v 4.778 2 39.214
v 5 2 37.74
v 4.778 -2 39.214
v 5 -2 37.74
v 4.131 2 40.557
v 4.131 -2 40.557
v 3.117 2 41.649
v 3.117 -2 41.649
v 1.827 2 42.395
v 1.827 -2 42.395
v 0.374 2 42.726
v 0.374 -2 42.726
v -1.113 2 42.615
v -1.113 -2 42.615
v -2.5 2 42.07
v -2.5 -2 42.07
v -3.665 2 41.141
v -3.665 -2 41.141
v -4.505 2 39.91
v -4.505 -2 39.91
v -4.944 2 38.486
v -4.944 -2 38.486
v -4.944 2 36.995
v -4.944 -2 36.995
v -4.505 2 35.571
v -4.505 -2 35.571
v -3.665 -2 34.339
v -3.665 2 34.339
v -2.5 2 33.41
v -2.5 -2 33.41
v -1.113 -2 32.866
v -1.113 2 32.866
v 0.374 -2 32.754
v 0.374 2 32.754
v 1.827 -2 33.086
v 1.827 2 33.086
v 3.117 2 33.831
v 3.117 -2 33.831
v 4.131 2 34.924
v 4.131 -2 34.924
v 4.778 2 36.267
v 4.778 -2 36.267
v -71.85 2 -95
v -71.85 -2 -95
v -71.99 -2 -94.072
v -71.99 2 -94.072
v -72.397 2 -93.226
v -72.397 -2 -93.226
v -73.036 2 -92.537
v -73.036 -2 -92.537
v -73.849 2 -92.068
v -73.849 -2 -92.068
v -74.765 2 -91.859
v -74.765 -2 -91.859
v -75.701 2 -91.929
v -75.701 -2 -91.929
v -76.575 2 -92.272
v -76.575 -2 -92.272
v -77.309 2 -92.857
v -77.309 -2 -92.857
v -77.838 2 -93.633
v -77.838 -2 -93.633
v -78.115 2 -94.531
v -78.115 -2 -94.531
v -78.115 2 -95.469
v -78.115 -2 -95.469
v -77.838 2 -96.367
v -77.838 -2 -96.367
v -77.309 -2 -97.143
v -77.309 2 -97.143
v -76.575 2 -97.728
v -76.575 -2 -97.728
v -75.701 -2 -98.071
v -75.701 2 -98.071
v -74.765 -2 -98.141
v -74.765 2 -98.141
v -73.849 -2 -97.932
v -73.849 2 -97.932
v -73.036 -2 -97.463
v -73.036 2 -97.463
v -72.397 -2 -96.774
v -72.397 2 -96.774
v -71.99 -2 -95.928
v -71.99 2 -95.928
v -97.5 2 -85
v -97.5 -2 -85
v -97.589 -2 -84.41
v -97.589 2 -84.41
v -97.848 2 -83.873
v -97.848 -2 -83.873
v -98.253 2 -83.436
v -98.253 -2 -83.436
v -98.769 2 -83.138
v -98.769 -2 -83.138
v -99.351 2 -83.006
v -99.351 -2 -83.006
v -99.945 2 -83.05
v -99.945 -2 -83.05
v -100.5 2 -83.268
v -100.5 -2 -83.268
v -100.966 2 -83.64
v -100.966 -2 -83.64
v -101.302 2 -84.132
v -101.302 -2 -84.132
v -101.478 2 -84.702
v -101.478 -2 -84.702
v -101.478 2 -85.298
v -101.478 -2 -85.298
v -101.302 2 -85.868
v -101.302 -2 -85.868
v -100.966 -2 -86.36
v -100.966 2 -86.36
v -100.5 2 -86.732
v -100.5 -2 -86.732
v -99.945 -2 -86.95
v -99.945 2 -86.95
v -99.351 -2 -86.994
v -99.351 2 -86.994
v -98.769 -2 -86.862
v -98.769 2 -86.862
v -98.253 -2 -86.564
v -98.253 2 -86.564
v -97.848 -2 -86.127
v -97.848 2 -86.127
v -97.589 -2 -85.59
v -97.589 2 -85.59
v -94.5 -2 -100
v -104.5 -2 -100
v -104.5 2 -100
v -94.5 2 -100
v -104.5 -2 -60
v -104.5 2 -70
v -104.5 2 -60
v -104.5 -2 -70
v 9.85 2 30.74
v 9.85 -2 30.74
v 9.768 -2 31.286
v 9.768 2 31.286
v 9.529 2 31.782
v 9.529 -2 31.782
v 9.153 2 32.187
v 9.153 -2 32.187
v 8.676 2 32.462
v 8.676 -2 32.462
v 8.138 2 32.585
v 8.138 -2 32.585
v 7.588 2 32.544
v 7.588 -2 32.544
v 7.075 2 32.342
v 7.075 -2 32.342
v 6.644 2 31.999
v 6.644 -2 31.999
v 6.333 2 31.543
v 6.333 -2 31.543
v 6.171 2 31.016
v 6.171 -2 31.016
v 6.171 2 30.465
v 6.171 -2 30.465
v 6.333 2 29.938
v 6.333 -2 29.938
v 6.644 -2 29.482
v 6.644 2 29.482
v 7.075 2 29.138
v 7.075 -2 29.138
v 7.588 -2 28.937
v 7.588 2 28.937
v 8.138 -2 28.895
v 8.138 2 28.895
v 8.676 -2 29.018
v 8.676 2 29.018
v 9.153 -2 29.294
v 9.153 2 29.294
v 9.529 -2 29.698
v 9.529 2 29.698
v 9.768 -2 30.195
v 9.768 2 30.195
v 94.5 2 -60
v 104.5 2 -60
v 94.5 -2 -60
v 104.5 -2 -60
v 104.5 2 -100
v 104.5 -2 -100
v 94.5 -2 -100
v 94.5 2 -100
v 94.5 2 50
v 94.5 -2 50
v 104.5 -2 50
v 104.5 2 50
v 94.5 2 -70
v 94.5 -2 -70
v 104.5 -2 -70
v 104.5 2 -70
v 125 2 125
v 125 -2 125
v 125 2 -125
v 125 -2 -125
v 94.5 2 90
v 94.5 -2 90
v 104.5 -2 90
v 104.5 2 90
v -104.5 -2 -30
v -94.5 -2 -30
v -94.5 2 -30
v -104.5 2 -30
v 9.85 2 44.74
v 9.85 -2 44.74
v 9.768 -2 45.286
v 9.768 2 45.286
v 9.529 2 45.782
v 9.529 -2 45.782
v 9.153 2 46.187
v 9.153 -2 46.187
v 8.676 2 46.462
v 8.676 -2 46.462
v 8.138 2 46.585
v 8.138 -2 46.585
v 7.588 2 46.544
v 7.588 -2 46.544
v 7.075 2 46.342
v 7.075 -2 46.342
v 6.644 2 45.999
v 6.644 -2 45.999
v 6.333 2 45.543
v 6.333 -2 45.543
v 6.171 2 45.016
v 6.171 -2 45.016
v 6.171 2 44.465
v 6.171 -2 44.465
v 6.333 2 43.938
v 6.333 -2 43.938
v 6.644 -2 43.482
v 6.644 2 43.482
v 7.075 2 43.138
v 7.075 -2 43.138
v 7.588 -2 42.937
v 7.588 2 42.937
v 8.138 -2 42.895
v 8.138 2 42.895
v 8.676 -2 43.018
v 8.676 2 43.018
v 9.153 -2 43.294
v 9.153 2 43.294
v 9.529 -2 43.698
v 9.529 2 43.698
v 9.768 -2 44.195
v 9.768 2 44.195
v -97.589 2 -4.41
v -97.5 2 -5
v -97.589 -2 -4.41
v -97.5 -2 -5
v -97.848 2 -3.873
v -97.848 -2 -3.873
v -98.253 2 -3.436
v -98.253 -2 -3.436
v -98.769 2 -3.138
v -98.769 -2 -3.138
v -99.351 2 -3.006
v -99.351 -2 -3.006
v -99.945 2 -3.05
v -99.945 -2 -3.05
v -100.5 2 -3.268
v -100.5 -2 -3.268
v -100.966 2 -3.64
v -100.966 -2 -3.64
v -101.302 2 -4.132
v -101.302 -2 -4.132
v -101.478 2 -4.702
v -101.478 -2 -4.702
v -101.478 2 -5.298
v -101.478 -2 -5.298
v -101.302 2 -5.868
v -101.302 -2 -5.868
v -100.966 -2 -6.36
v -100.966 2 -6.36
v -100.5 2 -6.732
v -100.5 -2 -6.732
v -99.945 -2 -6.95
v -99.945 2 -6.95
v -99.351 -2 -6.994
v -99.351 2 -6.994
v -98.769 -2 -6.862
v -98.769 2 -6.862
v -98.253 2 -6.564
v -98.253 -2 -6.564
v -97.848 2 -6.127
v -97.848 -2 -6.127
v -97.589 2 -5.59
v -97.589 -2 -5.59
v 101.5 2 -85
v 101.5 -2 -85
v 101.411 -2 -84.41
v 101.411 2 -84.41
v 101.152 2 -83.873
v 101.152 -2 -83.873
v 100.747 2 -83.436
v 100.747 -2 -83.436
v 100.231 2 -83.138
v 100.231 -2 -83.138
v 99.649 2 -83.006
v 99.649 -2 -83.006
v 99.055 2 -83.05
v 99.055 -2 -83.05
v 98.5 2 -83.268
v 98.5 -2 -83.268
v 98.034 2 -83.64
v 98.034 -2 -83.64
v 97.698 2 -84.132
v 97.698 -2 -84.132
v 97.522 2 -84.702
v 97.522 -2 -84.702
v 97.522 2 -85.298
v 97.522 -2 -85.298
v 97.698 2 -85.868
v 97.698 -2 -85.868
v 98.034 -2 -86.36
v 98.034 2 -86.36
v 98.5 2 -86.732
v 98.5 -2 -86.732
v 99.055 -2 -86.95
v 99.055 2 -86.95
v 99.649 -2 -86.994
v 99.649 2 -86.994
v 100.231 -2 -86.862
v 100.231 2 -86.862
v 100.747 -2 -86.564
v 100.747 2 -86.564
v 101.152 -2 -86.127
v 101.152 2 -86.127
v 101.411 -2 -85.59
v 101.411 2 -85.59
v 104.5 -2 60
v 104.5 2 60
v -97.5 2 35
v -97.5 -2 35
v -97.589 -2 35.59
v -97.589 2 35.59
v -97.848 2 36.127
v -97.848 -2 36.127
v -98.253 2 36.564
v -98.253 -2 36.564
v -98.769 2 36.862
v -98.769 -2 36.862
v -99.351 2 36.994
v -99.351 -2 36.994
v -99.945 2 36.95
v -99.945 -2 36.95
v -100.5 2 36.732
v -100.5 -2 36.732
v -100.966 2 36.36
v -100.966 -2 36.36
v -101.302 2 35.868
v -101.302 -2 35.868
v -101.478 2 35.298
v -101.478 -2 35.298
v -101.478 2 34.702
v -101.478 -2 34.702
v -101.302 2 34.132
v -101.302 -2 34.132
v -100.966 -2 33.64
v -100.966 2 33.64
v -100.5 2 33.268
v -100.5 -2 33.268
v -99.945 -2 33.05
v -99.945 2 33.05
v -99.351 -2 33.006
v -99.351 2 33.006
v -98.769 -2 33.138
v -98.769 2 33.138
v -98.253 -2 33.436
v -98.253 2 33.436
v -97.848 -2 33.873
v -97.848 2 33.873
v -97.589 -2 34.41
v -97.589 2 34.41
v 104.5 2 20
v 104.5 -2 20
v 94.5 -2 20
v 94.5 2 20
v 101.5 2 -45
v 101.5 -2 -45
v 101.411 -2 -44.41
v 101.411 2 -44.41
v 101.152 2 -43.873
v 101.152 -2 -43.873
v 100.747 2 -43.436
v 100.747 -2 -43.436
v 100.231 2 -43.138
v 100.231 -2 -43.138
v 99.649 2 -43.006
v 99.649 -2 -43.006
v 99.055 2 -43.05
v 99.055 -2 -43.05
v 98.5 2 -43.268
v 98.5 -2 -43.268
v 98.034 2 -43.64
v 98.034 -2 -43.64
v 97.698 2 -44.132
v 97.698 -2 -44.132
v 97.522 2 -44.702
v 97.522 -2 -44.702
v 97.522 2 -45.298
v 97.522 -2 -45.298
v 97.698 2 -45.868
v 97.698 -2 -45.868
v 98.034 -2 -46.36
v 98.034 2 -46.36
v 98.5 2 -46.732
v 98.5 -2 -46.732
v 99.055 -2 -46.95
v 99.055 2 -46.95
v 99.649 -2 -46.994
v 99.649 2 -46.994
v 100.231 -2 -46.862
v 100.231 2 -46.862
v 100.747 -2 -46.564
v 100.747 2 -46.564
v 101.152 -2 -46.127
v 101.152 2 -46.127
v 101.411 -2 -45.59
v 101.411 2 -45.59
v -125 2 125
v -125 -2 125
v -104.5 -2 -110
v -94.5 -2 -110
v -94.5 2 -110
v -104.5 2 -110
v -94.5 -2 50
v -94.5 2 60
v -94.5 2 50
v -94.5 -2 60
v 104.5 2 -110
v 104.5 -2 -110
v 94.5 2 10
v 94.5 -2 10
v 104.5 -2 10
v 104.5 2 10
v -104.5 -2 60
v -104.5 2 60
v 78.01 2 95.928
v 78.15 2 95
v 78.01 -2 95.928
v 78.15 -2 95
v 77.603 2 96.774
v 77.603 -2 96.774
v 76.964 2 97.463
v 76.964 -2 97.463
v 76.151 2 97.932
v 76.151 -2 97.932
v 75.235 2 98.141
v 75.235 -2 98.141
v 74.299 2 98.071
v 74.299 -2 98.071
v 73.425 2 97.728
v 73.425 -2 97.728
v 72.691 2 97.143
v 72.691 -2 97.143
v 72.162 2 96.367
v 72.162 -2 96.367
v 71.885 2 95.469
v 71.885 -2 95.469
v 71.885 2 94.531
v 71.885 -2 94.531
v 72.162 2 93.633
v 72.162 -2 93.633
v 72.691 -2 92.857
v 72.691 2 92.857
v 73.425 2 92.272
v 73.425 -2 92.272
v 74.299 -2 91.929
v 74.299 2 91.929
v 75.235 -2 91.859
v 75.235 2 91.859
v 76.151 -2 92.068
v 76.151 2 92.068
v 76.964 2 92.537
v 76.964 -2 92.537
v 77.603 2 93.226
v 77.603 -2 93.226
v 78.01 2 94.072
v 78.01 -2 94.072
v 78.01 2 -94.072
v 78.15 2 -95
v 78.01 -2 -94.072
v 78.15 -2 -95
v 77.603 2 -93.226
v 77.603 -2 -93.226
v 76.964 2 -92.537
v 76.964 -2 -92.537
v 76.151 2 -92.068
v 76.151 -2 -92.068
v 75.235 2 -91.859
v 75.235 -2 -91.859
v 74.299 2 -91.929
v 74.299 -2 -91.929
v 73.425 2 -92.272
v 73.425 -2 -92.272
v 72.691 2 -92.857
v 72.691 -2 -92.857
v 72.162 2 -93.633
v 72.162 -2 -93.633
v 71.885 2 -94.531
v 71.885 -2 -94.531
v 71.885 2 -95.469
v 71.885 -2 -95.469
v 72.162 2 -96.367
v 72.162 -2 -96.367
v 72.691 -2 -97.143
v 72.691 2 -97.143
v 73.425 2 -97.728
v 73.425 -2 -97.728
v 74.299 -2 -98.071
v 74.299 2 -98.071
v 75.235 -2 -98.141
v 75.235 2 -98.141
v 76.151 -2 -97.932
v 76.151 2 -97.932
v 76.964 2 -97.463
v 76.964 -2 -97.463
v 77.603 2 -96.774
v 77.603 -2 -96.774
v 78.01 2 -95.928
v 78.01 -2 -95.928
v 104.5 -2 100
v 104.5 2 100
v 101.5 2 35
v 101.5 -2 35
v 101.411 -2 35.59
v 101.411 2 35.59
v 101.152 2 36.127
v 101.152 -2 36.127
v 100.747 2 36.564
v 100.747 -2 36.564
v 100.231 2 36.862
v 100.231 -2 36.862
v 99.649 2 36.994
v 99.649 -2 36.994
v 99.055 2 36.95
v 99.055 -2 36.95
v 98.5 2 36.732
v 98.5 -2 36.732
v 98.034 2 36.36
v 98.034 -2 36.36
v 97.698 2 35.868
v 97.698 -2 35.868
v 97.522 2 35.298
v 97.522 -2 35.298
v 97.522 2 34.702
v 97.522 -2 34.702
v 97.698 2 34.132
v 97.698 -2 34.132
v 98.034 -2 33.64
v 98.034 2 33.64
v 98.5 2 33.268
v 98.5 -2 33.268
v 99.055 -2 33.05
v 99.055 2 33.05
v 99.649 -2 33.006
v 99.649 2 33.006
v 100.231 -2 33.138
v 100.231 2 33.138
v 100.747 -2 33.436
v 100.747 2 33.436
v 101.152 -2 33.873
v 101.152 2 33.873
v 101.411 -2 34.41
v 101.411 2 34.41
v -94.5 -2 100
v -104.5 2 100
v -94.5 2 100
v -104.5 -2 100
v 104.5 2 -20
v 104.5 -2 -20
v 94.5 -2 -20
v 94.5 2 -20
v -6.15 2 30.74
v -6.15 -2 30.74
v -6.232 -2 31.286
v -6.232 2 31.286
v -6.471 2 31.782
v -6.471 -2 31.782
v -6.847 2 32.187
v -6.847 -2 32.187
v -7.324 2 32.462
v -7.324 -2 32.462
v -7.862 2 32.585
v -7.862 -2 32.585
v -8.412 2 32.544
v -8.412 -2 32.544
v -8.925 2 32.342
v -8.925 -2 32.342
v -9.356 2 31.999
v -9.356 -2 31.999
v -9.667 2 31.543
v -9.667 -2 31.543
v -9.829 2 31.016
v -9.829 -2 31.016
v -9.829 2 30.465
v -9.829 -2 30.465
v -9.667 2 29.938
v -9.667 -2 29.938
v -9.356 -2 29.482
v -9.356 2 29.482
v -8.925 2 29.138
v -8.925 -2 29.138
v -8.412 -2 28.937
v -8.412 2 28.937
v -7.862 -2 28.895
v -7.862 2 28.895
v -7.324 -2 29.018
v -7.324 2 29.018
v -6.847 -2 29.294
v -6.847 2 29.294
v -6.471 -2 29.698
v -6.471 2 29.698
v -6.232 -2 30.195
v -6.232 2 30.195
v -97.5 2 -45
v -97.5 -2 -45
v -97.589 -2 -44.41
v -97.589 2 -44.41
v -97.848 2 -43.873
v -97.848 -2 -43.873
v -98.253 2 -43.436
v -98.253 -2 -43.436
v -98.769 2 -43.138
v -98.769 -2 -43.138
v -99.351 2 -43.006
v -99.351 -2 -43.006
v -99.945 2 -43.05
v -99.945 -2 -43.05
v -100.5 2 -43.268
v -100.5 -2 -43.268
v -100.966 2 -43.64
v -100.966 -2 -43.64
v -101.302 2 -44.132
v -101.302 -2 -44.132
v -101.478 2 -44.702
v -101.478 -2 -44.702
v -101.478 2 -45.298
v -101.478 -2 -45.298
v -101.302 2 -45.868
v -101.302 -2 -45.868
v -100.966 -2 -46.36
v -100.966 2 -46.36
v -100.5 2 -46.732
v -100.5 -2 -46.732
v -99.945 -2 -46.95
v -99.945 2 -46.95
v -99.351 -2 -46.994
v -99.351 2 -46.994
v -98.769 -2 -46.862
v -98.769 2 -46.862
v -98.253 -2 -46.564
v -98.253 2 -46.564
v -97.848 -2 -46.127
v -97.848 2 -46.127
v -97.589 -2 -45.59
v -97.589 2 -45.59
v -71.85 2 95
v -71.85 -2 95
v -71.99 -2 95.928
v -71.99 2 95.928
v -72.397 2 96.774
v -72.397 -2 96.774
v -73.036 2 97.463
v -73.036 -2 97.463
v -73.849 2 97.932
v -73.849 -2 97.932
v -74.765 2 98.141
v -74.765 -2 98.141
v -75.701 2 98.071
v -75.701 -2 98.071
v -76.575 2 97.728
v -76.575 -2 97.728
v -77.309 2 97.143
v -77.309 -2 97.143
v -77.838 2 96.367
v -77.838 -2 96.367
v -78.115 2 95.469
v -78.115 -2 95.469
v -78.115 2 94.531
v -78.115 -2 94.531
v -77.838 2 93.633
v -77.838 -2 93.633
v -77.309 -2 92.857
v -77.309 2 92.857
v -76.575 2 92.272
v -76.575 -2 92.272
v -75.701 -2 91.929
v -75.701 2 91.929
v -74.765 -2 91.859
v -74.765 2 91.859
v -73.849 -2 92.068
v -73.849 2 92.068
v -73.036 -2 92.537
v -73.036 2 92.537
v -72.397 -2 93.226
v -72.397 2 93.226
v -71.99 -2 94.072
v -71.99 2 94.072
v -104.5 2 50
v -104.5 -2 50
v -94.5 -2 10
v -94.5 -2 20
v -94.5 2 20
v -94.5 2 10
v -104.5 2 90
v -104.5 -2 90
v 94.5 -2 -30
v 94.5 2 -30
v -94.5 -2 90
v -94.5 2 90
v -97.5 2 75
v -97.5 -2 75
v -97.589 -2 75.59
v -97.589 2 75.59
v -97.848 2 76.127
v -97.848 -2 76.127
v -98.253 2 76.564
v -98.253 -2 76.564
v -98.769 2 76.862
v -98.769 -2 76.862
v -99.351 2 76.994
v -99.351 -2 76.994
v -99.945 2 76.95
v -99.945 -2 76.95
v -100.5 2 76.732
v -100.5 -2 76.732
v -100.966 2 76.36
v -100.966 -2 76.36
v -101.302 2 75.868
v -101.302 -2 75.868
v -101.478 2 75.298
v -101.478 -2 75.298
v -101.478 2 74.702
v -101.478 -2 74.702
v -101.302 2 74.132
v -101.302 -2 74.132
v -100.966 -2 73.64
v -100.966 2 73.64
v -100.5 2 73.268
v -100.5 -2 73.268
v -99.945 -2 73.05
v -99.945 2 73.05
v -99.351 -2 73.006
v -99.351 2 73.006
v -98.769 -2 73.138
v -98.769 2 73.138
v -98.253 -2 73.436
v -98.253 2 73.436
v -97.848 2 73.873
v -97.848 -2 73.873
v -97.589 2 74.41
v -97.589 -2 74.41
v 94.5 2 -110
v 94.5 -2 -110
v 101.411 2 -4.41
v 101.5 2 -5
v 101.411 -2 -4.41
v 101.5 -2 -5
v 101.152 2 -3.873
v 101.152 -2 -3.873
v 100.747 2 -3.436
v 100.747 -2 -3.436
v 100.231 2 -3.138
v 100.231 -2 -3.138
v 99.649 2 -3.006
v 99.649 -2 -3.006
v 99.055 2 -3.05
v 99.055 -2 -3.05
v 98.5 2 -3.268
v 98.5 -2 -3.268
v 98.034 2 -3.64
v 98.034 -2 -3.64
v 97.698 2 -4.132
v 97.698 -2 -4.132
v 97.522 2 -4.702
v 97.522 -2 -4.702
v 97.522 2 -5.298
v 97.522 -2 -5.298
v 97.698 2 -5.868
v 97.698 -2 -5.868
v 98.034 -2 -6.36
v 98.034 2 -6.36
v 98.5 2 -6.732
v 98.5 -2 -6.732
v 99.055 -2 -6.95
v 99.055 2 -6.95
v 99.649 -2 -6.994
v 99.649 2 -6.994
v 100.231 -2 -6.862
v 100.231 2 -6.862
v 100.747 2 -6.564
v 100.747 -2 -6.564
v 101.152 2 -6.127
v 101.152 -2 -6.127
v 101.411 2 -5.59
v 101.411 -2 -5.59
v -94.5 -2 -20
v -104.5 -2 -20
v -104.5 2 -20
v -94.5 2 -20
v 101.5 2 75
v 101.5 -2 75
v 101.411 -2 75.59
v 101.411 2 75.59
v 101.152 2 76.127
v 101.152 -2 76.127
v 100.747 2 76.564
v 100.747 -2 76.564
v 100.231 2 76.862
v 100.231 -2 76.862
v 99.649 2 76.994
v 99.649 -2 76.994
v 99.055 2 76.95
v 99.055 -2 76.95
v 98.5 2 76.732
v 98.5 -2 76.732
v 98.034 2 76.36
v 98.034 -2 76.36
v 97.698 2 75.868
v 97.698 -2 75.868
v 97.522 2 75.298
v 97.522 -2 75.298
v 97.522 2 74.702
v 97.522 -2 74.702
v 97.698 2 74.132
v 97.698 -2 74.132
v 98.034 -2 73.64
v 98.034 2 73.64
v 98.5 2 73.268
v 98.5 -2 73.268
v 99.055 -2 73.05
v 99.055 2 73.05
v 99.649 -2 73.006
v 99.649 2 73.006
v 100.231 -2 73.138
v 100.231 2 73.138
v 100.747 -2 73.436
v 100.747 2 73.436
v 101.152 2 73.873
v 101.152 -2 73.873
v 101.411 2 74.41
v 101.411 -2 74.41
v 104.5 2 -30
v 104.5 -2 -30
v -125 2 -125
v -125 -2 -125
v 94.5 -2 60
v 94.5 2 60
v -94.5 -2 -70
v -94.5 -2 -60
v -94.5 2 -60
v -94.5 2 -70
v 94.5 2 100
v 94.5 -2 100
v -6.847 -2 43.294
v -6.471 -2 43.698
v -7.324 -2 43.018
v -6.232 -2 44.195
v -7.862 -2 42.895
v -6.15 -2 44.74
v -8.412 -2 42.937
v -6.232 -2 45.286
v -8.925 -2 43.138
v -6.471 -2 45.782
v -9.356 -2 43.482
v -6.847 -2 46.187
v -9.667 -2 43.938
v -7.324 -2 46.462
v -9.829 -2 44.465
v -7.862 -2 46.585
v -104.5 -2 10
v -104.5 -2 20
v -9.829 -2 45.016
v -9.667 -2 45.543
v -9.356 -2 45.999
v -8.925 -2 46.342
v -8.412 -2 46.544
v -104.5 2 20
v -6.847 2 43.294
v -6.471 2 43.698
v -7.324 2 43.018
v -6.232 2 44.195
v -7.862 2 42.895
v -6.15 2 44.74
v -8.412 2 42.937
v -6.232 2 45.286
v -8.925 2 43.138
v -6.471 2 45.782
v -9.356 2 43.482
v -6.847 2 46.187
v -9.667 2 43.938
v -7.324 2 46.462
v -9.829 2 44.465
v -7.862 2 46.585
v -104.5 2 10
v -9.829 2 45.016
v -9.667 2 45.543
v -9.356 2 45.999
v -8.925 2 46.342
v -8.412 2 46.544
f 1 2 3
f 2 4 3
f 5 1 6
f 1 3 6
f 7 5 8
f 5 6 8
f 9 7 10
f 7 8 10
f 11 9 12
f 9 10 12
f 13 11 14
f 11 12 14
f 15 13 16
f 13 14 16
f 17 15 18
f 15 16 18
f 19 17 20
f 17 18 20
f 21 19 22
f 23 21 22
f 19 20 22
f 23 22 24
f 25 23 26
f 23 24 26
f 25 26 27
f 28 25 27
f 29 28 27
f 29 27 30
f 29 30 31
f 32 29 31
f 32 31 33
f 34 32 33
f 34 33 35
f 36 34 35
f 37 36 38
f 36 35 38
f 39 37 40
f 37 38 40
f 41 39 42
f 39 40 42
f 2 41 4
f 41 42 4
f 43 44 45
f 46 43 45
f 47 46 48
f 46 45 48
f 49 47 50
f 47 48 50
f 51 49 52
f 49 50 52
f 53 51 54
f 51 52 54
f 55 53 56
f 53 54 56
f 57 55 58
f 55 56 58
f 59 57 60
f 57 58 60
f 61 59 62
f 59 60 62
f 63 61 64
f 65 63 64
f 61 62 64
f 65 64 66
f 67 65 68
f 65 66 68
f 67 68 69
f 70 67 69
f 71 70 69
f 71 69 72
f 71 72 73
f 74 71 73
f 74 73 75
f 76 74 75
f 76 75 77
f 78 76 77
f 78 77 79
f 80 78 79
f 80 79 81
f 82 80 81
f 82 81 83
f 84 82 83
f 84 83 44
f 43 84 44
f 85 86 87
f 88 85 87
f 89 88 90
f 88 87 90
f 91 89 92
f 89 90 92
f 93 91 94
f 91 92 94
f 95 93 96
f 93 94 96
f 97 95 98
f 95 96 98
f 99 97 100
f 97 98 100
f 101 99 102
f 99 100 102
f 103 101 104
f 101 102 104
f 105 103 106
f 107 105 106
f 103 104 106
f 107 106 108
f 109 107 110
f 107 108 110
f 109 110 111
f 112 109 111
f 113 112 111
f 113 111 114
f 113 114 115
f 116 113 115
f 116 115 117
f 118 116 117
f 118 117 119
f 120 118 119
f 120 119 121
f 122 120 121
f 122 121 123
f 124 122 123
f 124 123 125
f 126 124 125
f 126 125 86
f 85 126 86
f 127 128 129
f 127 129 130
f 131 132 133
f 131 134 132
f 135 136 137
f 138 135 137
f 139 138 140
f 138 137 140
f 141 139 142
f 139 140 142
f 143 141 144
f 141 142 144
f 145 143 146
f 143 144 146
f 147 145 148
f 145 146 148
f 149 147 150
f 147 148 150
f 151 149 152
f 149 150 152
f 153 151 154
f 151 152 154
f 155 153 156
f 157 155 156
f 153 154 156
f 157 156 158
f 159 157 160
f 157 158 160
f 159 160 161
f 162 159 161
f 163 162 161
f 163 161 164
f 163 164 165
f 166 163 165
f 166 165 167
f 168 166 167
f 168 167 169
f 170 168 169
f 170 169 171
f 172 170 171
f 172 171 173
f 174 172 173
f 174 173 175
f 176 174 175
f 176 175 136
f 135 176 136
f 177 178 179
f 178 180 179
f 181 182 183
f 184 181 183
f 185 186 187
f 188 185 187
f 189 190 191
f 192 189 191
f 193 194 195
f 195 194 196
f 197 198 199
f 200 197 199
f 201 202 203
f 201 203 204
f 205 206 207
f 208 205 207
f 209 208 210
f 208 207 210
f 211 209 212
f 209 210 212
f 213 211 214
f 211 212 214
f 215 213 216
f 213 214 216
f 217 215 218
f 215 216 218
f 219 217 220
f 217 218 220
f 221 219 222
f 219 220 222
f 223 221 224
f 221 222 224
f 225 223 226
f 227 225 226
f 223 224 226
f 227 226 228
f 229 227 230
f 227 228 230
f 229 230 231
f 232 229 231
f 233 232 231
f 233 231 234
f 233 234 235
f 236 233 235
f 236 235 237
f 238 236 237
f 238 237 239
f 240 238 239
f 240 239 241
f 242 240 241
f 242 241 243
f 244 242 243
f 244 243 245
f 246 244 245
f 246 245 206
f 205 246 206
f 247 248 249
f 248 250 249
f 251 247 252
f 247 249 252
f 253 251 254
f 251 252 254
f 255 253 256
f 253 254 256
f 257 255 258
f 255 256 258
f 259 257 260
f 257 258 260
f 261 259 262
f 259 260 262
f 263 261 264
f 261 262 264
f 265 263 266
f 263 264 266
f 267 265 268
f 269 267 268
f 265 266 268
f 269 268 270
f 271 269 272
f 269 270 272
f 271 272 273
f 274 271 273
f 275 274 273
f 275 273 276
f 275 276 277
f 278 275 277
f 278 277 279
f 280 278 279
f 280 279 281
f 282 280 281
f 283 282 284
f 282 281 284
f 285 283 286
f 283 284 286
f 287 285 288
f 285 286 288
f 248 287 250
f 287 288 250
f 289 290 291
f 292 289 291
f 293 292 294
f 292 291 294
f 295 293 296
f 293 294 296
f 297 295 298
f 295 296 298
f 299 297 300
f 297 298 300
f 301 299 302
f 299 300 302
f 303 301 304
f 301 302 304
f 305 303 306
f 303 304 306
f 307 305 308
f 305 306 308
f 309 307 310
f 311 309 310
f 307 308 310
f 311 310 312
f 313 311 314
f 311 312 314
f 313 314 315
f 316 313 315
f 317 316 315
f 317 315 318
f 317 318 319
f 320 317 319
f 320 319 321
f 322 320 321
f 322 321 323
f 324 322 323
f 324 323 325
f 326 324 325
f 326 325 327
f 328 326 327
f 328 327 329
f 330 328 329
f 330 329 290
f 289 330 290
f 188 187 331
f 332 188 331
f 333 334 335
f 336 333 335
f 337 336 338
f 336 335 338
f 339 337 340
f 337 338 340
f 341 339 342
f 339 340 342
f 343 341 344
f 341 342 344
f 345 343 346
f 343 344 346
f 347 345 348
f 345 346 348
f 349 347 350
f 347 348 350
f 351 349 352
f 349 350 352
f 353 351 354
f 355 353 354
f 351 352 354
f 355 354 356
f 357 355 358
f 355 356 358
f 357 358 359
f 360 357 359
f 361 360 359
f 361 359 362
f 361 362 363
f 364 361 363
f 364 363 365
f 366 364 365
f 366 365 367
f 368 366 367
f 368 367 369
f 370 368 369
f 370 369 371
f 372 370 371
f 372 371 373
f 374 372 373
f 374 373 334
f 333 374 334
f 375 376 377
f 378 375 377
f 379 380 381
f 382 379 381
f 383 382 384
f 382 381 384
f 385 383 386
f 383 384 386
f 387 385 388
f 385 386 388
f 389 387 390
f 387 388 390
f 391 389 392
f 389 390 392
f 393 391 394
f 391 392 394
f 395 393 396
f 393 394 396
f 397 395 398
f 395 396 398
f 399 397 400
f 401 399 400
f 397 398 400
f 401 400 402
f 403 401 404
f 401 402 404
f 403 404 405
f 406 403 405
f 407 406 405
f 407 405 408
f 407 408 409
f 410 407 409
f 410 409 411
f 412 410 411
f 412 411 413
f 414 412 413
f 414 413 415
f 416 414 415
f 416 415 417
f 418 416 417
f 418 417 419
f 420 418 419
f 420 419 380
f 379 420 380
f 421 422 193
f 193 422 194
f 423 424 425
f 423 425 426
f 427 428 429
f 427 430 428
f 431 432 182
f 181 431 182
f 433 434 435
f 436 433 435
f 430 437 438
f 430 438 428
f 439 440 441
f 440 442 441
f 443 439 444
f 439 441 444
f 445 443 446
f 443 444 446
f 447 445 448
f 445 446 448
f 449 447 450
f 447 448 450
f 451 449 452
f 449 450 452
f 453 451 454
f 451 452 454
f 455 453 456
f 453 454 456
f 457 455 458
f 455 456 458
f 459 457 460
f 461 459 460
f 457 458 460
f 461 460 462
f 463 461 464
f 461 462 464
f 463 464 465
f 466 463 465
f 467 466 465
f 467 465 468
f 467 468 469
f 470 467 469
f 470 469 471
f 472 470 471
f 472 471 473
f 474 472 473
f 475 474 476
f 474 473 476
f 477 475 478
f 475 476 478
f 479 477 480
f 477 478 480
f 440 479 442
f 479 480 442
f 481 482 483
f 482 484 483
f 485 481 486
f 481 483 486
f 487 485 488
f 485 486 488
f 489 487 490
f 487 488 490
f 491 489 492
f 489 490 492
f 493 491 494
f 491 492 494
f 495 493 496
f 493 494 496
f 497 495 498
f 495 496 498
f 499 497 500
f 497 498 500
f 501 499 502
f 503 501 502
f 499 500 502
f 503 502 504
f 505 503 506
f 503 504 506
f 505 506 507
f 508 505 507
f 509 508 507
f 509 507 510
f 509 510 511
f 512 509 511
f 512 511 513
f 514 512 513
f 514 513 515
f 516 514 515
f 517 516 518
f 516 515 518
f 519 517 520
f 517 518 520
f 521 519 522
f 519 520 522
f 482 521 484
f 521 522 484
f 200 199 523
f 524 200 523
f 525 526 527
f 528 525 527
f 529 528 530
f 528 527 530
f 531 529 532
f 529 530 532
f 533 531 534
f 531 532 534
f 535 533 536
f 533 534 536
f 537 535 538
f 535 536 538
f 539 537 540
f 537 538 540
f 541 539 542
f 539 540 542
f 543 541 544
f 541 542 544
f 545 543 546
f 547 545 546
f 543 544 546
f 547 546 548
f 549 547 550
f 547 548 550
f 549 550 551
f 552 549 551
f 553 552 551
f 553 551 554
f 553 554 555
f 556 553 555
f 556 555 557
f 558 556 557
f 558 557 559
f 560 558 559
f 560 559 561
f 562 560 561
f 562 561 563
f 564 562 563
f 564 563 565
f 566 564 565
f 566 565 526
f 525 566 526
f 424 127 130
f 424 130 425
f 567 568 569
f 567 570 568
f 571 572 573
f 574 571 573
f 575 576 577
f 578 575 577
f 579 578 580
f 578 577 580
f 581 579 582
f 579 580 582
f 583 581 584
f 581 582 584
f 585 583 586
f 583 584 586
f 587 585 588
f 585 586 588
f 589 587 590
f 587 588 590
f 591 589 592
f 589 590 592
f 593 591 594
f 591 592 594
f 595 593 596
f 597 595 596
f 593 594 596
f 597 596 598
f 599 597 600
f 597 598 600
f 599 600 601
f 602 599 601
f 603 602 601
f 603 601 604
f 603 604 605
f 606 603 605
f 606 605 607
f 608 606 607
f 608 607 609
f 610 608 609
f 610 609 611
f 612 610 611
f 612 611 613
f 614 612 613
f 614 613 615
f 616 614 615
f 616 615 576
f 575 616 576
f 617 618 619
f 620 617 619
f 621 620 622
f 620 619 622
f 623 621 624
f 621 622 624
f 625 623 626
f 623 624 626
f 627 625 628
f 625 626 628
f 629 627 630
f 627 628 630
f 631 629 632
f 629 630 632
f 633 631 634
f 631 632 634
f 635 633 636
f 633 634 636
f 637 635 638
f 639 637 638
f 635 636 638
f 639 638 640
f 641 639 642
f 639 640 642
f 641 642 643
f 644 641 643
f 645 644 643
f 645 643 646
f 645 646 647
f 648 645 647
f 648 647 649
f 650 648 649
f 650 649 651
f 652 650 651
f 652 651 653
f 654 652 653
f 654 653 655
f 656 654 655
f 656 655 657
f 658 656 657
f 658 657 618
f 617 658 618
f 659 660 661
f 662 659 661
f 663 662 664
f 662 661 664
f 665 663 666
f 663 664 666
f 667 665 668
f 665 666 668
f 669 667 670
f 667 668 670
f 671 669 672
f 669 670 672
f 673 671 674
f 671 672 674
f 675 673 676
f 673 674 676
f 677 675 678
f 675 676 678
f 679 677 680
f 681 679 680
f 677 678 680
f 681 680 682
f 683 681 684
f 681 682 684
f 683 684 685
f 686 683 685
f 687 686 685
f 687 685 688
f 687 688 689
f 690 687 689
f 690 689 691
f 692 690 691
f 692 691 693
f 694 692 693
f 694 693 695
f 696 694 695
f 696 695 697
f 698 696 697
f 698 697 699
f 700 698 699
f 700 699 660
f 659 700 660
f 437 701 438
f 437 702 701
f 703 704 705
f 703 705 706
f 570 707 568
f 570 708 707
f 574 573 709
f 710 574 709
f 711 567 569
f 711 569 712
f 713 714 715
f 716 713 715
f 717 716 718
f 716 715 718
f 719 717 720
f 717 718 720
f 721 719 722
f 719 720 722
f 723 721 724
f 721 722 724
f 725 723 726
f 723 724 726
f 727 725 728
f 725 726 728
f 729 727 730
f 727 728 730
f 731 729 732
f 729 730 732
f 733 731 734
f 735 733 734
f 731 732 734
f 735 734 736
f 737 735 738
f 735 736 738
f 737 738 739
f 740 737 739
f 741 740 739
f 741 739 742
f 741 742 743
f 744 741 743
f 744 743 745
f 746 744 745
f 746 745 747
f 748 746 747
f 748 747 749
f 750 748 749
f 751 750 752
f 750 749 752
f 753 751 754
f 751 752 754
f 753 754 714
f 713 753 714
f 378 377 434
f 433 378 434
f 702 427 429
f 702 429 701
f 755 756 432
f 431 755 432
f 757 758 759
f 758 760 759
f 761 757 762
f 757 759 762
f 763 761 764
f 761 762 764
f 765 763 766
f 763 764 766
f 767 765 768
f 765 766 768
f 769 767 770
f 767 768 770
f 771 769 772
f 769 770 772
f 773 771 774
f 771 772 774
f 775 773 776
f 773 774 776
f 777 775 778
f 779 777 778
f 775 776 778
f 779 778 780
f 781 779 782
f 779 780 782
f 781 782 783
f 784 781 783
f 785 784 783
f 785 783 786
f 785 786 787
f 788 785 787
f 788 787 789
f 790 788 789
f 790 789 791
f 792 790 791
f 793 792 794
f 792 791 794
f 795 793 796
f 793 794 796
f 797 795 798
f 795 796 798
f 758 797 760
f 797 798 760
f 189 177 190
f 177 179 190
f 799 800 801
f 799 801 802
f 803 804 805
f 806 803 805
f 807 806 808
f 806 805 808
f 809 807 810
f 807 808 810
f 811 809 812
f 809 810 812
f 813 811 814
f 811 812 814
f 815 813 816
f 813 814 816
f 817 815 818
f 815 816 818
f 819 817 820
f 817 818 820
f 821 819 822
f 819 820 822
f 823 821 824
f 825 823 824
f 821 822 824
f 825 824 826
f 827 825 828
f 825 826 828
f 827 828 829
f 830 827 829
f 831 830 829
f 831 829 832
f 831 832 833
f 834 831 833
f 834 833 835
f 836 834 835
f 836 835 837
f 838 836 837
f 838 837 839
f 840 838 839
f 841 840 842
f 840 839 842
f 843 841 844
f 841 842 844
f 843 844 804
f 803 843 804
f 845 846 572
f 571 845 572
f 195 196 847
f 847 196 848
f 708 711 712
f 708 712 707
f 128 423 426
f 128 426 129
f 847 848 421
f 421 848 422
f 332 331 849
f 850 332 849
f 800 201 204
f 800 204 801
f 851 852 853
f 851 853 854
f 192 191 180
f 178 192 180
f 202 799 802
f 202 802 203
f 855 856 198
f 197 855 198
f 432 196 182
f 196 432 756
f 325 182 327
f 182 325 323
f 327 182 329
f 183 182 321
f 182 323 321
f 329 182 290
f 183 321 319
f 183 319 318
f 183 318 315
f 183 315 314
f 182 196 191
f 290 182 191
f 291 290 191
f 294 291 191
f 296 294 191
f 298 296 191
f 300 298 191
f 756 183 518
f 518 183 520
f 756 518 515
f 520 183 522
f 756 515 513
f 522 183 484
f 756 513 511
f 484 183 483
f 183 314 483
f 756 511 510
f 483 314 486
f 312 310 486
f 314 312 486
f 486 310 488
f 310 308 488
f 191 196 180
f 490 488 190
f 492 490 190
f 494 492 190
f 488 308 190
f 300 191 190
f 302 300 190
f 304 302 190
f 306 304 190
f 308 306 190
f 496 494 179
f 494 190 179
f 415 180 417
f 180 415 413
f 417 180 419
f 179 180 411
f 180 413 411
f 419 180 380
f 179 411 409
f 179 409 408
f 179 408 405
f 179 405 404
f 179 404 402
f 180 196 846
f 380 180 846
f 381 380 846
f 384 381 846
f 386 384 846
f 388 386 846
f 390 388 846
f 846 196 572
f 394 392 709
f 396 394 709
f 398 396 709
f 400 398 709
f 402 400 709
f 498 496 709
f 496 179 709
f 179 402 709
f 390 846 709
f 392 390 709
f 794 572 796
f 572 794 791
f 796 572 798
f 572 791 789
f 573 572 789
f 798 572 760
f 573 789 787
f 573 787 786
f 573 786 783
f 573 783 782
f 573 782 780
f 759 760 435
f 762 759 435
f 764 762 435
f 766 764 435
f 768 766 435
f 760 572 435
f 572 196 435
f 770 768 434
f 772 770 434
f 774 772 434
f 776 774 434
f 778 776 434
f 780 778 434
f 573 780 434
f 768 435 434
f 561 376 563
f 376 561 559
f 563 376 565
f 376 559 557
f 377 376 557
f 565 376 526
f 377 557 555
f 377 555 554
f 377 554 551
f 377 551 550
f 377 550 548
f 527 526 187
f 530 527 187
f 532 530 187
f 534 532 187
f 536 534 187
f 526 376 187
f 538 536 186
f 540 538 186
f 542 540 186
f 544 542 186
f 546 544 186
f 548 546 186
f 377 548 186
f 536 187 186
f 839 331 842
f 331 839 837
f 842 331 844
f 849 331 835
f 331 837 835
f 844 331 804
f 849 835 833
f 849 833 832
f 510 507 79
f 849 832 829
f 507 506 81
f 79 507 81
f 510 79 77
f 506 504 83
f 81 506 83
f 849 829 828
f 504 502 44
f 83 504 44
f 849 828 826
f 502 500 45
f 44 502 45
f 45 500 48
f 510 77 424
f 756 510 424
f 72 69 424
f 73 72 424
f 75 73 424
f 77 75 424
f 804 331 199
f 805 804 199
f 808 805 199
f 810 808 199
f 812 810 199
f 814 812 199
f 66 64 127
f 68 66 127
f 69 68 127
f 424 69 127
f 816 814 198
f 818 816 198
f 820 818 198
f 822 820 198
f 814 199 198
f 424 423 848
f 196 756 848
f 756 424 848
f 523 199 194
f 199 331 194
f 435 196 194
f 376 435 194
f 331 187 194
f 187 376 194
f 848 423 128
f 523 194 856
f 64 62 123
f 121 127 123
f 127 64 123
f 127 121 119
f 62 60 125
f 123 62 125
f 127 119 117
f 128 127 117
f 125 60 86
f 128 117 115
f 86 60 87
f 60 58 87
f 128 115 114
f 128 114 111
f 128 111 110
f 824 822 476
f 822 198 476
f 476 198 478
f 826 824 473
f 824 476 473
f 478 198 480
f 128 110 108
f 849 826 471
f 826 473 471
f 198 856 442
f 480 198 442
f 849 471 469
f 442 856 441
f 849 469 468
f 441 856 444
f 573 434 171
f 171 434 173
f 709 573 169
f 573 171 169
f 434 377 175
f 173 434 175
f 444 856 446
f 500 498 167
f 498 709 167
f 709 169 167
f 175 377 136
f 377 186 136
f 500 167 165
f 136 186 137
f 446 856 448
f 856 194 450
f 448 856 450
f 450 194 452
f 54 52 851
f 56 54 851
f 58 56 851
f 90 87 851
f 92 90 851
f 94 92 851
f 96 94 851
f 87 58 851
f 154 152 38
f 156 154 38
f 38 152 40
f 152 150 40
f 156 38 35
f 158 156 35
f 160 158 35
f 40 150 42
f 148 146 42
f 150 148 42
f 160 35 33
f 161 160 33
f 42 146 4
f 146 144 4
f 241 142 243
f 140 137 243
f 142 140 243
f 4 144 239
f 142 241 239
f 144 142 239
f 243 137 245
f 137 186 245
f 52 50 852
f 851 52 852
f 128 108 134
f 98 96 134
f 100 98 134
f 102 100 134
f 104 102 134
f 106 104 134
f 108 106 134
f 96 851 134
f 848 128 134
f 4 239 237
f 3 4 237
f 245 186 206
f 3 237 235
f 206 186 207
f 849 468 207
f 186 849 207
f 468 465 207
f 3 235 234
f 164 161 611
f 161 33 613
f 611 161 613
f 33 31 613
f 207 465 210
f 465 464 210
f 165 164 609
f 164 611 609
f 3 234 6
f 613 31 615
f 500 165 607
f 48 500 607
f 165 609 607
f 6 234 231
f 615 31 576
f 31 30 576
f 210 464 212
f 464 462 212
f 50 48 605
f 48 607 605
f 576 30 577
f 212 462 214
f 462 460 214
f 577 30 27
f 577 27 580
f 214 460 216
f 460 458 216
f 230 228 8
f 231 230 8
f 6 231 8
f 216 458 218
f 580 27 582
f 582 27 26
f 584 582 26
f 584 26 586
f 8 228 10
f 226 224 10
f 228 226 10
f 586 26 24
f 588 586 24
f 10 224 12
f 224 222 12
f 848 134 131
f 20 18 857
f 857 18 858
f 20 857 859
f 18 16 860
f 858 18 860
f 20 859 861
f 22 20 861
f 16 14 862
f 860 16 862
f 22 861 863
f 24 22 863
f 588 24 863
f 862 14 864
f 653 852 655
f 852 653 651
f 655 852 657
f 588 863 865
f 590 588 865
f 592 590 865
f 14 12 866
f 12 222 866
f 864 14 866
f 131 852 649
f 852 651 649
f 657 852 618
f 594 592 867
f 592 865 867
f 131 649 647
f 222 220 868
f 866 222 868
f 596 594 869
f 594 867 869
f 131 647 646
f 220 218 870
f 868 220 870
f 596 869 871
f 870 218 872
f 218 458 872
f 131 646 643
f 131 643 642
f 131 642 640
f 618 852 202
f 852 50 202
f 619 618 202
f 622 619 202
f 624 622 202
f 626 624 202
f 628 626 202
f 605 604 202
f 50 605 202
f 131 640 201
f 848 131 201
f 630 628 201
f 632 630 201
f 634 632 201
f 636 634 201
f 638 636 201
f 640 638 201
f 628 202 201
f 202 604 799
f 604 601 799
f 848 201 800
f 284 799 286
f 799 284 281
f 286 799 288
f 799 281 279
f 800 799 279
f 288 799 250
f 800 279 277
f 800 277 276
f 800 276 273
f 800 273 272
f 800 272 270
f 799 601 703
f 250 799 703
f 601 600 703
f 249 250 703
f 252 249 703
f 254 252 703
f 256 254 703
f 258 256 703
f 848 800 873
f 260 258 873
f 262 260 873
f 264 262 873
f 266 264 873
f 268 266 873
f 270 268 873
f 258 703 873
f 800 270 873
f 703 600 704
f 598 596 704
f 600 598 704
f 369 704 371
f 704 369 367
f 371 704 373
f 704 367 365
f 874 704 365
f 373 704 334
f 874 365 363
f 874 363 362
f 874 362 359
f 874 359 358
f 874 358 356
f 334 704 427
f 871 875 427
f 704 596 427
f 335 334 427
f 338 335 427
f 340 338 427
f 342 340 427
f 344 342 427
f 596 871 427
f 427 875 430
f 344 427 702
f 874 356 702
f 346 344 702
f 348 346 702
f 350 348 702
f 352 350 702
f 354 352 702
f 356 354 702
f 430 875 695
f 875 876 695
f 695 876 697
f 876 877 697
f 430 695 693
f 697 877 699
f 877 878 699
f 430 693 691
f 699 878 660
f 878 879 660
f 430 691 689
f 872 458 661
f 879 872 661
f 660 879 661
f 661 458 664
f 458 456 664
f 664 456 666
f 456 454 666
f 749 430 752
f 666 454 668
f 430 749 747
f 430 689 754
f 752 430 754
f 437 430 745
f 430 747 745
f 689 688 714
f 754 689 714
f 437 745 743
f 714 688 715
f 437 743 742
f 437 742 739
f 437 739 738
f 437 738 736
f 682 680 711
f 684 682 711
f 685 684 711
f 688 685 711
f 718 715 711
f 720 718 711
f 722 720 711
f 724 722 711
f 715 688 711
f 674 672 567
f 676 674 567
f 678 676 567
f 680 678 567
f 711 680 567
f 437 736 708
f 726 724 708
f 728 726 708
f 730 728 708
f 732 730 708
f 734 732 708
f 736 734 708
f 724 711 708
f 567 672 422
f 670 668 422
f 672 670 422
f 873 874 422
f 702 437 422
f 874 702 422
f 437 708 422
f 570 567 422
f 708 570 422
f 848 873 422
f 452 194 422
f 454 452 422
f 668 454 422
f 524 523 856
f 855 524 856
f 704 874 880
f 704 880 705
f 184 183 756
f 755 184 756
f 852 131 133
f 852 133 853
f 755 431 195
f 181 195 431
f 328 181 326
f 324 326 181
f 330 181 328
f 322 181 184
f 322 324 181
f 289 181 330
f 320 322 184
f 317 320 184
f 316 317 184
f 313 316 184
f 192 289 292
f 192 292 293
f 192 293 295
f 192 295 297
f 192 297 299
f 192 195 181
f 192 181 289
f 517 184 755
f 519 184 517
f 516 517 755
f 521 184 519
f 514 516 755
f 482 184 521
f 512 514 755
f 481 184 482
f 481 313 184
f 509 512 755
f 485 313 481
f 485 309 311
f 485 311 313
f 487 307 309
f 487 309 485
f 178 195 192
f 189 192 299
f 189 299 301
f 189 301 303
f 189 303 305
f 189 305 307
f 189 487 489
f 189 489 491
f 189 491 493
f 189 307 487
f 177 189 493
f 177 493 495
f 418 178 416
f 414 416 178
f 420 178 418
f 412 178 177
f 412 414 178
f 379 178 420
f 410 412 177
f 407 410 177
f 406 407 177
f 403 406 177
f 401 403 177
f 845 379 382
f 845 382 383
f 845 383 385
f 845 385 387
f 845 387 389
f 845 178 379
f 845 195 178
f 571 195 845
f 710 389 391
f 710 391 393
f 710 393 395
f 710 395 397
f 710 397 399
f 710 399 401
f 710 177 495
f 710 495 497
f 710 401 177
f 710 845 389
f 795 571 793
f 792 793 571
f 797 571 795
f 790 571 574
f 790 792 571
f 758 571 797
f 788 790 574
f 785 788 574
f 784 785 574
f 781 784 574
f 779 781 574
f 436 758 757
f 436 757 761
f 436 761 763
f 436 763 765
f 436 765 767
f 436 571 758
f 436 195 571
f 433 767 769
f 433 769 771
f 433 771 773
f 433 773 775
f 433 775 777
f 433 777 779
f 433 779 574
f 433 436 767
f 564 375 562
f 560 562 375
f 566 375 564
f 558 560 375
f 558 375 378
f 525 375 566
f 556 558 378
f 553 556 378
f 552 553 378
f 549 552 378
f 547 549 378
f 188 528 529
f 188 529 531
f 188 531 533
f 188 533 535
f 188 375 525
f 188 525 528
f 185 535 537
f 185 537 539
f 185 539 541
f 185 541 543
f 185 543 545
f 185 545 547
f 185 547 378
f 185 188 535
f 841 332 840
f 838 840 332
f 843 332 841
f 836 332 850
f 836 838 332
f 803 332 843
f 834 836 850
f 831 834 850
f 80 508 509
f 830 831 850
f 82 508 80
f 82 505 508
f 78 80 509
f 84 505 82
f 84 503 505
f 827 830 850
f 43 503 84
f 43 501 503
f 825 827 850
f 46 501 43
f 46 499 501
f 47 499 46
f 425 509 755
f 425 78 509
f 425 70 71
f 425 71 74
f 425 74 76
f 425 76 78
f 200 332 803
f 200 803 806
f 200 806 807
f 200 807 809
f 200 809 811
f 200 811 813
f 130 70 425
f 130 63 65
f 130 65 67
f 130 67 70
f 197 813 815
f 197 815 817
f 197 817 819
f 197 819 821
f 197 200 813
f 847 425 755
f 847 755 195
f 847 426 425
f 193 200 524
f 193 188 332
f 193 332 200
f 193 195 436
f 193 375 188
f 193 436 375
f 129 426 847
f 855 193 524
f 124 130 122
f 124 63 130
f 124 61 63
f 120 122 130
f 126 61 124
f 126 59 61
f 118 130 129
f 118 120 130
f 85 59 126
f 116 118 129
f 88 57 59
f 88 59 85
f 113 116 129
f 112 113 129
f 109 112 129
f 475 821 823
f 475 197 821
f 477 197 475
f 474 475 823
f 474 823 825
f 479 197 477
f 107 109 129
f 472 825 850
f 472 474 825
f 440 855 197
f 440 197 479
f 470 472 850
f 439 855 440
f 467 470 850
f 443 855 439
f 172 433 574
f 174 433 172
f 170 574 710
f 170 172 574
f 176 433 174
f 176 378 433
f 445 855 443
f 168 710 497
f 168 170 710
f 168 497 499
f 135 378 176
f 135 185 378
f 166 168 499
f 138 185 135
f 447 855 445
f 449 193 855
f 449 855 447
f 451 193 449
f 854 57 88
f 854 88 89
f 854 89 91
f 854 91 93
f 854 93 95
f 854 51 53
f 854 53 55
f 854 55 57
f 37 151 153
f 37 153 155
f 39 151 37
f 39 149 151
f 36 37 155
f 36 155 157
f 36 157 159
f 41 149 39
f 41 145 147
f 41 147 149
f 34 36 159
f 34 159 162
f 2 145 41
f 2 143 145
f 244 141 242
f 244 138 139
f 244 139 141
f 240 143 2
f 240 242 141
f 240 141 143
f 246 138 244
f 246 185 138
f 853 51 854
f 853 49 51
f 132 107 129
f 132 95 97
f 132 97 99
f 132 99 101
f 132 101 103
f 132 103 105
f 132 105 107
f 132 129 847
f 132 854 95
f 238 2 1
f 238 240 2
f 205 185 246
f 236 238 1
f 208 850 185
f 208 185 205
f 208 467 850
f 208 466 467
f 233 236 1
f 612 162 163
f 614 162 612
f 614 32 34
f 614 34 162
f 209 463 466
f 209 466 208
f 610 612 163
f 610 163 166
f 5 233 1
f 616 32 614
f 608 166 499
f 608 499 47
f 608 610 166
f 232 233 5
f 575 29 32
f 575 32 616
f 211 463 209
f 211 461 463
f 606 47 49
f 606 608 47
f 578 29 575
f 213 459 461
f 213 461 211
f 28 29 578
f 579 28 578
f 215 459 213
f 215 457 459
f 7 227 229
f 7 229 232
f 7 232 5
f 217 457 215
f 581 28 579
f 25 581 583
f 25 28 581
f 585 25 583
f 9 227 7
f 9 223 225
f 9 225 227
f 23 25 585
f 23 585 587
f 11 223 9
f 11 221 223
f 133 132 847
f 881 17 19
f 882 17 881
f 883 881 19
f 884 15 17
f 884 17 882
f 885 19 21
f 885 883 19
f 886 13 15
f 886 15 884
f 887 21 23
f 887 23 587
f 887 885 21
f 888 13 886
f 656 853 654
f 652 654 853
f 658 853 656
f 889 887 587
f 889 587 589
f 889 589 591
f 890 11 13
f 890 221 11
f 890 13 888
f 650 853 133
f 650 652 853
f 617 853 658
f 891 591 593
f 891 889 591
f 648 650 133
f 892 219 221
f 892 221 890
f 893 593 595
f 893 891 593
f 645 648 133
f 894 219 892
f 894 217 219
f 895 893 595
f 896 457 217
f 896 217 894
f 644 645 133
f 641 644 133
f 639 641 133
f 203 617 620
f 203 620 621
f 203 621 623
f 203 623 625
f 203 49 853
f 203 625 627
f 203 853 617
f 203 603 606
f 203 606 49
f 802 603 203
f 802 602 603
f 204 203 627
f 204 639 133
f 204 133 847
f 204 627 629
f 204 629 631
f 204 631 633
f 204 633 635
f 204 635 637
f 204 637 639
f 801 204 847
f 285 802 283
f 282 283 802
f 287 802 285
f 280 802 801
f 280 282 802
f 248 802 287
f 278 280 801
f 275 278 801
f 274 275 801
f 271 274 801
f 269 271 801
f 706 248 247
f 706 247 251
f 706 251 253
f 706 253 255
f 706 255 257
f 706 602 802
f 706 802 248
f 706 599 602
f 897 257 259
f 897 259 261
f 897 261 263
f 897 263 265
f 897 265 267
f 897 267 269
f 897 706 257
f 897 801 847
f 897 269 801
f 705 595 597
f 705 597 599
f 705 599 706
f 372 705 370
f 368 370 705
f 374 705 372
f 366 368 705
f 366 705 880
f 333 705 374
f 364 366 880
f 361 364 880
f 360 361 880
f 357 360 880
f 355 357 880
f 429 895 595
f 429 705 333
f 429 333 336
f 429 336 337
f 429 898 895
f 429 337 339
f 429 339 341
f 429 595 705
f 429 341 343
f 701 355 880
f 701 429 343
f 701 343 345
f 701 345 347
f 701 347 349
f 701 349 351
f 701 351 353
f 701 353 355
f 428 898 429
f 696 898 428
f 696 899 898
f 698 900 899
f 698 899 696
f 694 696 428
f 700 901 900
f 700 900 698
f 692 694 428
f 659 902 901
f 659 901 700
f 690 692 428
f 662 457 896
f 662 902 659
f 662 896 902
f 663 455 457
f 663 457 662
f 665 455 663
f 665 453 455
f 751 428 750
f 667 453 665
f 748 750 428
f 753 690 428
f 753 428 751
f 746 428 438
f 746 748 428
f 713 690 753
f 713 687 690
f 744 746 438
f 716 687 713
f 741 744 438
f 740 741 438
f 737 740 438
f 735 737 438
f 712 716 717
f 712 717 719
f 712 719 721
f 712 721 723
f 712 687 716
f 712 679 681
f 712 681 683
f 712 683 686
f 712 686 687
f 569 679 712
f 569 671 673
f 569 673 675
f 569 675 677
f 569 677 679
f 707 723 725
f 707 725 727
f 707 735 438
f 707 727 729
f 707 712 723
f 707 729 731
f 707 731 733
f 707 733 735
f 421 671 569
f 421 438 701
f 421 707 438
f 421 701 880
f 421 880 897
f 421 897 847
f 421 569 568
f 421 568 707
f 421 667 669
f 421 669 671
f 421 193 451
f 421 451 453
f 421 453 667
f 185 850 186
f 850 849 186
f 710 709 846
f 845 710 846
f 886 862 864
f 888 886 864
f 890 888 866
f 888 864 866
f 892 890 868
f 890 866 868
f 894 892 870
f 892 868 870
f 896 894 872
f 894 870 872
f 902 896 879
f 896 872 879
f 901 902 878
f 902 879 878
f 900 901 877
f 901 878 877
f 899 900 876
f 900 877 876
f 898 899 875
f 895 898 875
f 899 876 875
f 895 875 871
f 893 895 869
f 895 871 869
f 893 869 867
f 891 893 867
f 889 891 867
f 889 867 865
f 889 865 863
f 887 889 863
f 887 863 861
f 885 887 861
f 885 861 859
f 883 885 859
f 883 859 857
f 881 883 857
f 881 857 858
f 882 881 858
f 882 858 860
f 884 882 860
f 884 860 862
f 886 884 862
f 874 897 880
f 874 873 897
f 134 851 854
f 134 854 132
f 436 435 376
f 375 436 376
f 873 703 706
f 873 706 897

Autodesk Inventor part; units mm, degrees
ref_plane "YZ Plane" through (0, 0, 0) normal (1, 0, 0) x (0, 1, 0)
ref_plane "XZ Plane" through (0, 0, 0) normal (0, 1, 0) x (-1, 0, 0)
ref_plane "XY Plane" through (0, 0, 0) normal (0, 0, 1) x (1, 0, 0)
sketch "Эскиз1" plane through (0, 0, 0) normal (0, 1, 0) x (-1, 0, 0)
  line L0 (125, 125) -> (-125, 125)
  line L1 (-125, 125) -> (-125, -125)
  line L2 (-125, -125) -> (125, -125)
  line L3 (125, -125) -> (125, 125)
  line L4 (125, 125) -> (-125, -125) construction
  line L5 (-125, 125) -> (125, -125) construction
  point P0 (0, 0)
  dimension "d0" = 250
  dimension "d1" = 250
extrude "Выдавливание1" add sketch "Эскиз1" along normal mid plane 4
sketch "Эскиз2" plane through (0, -2, 0) normal (0, -1, 0) x (1, 0, 0)
  line L0 (104.5, -110) -> (104.5, -100) projected
  line L1 (104.5, -100) -> (94.5, -100) projected
  line L2 (94.5, -100) -> (94.5, -110) projected
  line L3 (94.5, -110) -> (104.5, -110) projected
  circle A0 centre (99.5, -85) radius 2 projected
  line L4 (104.5, -70) -> (104.5, -60) projected
  line L5 (104.5, -60) -> (94.5, -60) projected
  line L6 (94.5, -60) -> (94.5, -70) projected
  line L7 (94.5, -70) -> (104.5, -70) projected
  circle A1 centre (99.5, -45) radius 2 projected
  line L8 (104.5, -30) -> (104.5, -20) projected
  line L9 (104.5, -20) -> (94.5, -20) projected
  line L10 (94.5, -20) -> (94.5, -30) projected
  line L11 (94.5, -30) -> (104.5, -30) projected
  circle A2 centre (99.5, -5) radius 2 projected
  line L12 (104.5, 10) -> (104.5, 20) projected
  line L13 (104.5, 20) -> (94.5, 20) projected
  line L14 (94.5, 20) -> (94.5, 10) projected
  line L15 (94.5, 10) -> (104.5, 10) projected
  circle A3 centre (99.5, 35) radius 2 projected
  line L16 (94.5, 55) -> (94.5, 50) projected
  line L17 (94.5, 50) -> (104.5, 50) projected
  line L18 (104.5, 50) -> (104.5, 55) projected
  line L19 (104.5, 55) -> (104.5, 60) projected
  line L20 (104.5, 60) -> (94.5, 60) projected
  line L21 (94.5, 60) -> (94.5, 55) projected
  line L22 (104.5, 90) -> (104.5, 100) projected
  line L23 (104.5, 100) -> (94.5, 100) projected
  line L24 (94.5, 100) -> (94.5, 90) projected
  line L25 (94.5, 90) -> (104.5, 90) projected
  line L26 (-104.5, 90) -> (-104.5, 100) projected
  line L27 (-94.5, 90) -> (-104.5, 90) projected
  line L28 (-94.5, 100) -> (-94.5, 90) projected
  line L29 (-104.5, 100) -> (-94.5, 100) projected
  line L30 (-104.5, 50) -> (-104.5, 55) projected
  line L31 (-94.5, 50) -> (-104.5, 50) projected
  line L32 (-94.5, 55) -> (-94.5, 50) projected
  line L33 (-94.5, 60) -> (-94.5, 55) projected
  line L34 (-104.5, 60) -> (-94.5, 60) projected
  line L35 (-104.5, 55) -> (-104.5, 60) projected
  line L36 (-104.5, 10) -> (-104.5, 20) projected
  line L37 (-94.5, 10) -> (-104.5, 10) projected
  line L38 (-94.5, 20) -> (-94.5, 10) projected
  line L39 (-104.5, 20) -> (-94.5, 20) projected
  line L40 (-104.5, -30) -> (-104.5, -20) projected
  line L41 (-94.5, -30) -> (-104.5, -30) projected
  line L42 (-94.5, -20) -> (-94.5, -30) projected
  line L43 (-104.5, -20) -> (-94.5, -20) projected
  line L44 (-104.5, -70) -> (-104.5, -60) projected
  line L45 (-94.5, -70) -> (-104.5, -70) projected
  line L46 (-94.5, -60) -> (-94.5, -70) projected
  line L47 (-104.5, -60) -> (-94.5, -60) projected
  line L48 (-104.5, -110) -> (-104.5, -100) projected
  line L49 (-94.5, -110) -> (-104.5, -110) projected
  line L50 (-94.5, -100) -> (-94.5, -110) projected
  line L51 (-104.5, -100) -> (-94.5, -100) projected
  circle A4 centre (-99.5, -85) radius 2 projected
  circle A5 centre (-99.5, -45) radius 2 projected
  circle A6 centre (-99.5, -5) radius 2 projected
  circle A7 centre (-99.5, 35) radius 2 projected
  circle A8 centre (-99.5, 75) radius 2 projected
  circle A9 centre (99.5, 75) radius 2 projected
extrude "Выдавливание2" cut sketch "Эскиз2" against normal up to surface (4 mm away)
sketch "Эскиз3" plane through (0, -2, 0) normal (0, -1, 0) x (1, 0, 0)
  circle A0 centre (75, -95) radius 3.15
  line L0 (125, -125) -> (125, 125) projected
  line L1 (-125, -125) -> (125, -125) projected
  line L2 (0, -76.118) -> (0, 76.118) construction
  line L3 (24.9561, 0) -> (-24.9561, 0) construction
  circle A1 centre (-75, -95) radius 3.15
  line L4 (-24.9561, 0) -> (24.9561, 0) construction
  circle A2 centre (75, 95) radius 3.15
  circle A3 centre (-75, 95) radius 3.15
  point P0 (0, 0)
  point P1 (0, 0)
  dimension "d10" = 6.3
  dimension "d14" = 50
  dimension "d15" = 30
extrude "Выдавливание3" cut sketch "Эскиз3" against normal up to surface (4 mm away)
sketch "Эскиз4" plane through (0, -2, 0) normal (0, -1, 0) x (1, 0, 0)
  circle A0 centre (-8, 44.7403) radius 1.85
  circle A1 centre (-8, 30.7403) radius 1.85
  circle A2 centre (0, 37.7403) radius 5
  circle A3 centre (8, 44.7403) radius 1.85
  circle A4 centre (8, 30.7403) radius 1.85
  point P0 (0, 0)
extrude "Выдавливание4" cut sketch "Эскиз4" against normal up to surface (4 mm away)
properties part number "Основание подъёмника"
